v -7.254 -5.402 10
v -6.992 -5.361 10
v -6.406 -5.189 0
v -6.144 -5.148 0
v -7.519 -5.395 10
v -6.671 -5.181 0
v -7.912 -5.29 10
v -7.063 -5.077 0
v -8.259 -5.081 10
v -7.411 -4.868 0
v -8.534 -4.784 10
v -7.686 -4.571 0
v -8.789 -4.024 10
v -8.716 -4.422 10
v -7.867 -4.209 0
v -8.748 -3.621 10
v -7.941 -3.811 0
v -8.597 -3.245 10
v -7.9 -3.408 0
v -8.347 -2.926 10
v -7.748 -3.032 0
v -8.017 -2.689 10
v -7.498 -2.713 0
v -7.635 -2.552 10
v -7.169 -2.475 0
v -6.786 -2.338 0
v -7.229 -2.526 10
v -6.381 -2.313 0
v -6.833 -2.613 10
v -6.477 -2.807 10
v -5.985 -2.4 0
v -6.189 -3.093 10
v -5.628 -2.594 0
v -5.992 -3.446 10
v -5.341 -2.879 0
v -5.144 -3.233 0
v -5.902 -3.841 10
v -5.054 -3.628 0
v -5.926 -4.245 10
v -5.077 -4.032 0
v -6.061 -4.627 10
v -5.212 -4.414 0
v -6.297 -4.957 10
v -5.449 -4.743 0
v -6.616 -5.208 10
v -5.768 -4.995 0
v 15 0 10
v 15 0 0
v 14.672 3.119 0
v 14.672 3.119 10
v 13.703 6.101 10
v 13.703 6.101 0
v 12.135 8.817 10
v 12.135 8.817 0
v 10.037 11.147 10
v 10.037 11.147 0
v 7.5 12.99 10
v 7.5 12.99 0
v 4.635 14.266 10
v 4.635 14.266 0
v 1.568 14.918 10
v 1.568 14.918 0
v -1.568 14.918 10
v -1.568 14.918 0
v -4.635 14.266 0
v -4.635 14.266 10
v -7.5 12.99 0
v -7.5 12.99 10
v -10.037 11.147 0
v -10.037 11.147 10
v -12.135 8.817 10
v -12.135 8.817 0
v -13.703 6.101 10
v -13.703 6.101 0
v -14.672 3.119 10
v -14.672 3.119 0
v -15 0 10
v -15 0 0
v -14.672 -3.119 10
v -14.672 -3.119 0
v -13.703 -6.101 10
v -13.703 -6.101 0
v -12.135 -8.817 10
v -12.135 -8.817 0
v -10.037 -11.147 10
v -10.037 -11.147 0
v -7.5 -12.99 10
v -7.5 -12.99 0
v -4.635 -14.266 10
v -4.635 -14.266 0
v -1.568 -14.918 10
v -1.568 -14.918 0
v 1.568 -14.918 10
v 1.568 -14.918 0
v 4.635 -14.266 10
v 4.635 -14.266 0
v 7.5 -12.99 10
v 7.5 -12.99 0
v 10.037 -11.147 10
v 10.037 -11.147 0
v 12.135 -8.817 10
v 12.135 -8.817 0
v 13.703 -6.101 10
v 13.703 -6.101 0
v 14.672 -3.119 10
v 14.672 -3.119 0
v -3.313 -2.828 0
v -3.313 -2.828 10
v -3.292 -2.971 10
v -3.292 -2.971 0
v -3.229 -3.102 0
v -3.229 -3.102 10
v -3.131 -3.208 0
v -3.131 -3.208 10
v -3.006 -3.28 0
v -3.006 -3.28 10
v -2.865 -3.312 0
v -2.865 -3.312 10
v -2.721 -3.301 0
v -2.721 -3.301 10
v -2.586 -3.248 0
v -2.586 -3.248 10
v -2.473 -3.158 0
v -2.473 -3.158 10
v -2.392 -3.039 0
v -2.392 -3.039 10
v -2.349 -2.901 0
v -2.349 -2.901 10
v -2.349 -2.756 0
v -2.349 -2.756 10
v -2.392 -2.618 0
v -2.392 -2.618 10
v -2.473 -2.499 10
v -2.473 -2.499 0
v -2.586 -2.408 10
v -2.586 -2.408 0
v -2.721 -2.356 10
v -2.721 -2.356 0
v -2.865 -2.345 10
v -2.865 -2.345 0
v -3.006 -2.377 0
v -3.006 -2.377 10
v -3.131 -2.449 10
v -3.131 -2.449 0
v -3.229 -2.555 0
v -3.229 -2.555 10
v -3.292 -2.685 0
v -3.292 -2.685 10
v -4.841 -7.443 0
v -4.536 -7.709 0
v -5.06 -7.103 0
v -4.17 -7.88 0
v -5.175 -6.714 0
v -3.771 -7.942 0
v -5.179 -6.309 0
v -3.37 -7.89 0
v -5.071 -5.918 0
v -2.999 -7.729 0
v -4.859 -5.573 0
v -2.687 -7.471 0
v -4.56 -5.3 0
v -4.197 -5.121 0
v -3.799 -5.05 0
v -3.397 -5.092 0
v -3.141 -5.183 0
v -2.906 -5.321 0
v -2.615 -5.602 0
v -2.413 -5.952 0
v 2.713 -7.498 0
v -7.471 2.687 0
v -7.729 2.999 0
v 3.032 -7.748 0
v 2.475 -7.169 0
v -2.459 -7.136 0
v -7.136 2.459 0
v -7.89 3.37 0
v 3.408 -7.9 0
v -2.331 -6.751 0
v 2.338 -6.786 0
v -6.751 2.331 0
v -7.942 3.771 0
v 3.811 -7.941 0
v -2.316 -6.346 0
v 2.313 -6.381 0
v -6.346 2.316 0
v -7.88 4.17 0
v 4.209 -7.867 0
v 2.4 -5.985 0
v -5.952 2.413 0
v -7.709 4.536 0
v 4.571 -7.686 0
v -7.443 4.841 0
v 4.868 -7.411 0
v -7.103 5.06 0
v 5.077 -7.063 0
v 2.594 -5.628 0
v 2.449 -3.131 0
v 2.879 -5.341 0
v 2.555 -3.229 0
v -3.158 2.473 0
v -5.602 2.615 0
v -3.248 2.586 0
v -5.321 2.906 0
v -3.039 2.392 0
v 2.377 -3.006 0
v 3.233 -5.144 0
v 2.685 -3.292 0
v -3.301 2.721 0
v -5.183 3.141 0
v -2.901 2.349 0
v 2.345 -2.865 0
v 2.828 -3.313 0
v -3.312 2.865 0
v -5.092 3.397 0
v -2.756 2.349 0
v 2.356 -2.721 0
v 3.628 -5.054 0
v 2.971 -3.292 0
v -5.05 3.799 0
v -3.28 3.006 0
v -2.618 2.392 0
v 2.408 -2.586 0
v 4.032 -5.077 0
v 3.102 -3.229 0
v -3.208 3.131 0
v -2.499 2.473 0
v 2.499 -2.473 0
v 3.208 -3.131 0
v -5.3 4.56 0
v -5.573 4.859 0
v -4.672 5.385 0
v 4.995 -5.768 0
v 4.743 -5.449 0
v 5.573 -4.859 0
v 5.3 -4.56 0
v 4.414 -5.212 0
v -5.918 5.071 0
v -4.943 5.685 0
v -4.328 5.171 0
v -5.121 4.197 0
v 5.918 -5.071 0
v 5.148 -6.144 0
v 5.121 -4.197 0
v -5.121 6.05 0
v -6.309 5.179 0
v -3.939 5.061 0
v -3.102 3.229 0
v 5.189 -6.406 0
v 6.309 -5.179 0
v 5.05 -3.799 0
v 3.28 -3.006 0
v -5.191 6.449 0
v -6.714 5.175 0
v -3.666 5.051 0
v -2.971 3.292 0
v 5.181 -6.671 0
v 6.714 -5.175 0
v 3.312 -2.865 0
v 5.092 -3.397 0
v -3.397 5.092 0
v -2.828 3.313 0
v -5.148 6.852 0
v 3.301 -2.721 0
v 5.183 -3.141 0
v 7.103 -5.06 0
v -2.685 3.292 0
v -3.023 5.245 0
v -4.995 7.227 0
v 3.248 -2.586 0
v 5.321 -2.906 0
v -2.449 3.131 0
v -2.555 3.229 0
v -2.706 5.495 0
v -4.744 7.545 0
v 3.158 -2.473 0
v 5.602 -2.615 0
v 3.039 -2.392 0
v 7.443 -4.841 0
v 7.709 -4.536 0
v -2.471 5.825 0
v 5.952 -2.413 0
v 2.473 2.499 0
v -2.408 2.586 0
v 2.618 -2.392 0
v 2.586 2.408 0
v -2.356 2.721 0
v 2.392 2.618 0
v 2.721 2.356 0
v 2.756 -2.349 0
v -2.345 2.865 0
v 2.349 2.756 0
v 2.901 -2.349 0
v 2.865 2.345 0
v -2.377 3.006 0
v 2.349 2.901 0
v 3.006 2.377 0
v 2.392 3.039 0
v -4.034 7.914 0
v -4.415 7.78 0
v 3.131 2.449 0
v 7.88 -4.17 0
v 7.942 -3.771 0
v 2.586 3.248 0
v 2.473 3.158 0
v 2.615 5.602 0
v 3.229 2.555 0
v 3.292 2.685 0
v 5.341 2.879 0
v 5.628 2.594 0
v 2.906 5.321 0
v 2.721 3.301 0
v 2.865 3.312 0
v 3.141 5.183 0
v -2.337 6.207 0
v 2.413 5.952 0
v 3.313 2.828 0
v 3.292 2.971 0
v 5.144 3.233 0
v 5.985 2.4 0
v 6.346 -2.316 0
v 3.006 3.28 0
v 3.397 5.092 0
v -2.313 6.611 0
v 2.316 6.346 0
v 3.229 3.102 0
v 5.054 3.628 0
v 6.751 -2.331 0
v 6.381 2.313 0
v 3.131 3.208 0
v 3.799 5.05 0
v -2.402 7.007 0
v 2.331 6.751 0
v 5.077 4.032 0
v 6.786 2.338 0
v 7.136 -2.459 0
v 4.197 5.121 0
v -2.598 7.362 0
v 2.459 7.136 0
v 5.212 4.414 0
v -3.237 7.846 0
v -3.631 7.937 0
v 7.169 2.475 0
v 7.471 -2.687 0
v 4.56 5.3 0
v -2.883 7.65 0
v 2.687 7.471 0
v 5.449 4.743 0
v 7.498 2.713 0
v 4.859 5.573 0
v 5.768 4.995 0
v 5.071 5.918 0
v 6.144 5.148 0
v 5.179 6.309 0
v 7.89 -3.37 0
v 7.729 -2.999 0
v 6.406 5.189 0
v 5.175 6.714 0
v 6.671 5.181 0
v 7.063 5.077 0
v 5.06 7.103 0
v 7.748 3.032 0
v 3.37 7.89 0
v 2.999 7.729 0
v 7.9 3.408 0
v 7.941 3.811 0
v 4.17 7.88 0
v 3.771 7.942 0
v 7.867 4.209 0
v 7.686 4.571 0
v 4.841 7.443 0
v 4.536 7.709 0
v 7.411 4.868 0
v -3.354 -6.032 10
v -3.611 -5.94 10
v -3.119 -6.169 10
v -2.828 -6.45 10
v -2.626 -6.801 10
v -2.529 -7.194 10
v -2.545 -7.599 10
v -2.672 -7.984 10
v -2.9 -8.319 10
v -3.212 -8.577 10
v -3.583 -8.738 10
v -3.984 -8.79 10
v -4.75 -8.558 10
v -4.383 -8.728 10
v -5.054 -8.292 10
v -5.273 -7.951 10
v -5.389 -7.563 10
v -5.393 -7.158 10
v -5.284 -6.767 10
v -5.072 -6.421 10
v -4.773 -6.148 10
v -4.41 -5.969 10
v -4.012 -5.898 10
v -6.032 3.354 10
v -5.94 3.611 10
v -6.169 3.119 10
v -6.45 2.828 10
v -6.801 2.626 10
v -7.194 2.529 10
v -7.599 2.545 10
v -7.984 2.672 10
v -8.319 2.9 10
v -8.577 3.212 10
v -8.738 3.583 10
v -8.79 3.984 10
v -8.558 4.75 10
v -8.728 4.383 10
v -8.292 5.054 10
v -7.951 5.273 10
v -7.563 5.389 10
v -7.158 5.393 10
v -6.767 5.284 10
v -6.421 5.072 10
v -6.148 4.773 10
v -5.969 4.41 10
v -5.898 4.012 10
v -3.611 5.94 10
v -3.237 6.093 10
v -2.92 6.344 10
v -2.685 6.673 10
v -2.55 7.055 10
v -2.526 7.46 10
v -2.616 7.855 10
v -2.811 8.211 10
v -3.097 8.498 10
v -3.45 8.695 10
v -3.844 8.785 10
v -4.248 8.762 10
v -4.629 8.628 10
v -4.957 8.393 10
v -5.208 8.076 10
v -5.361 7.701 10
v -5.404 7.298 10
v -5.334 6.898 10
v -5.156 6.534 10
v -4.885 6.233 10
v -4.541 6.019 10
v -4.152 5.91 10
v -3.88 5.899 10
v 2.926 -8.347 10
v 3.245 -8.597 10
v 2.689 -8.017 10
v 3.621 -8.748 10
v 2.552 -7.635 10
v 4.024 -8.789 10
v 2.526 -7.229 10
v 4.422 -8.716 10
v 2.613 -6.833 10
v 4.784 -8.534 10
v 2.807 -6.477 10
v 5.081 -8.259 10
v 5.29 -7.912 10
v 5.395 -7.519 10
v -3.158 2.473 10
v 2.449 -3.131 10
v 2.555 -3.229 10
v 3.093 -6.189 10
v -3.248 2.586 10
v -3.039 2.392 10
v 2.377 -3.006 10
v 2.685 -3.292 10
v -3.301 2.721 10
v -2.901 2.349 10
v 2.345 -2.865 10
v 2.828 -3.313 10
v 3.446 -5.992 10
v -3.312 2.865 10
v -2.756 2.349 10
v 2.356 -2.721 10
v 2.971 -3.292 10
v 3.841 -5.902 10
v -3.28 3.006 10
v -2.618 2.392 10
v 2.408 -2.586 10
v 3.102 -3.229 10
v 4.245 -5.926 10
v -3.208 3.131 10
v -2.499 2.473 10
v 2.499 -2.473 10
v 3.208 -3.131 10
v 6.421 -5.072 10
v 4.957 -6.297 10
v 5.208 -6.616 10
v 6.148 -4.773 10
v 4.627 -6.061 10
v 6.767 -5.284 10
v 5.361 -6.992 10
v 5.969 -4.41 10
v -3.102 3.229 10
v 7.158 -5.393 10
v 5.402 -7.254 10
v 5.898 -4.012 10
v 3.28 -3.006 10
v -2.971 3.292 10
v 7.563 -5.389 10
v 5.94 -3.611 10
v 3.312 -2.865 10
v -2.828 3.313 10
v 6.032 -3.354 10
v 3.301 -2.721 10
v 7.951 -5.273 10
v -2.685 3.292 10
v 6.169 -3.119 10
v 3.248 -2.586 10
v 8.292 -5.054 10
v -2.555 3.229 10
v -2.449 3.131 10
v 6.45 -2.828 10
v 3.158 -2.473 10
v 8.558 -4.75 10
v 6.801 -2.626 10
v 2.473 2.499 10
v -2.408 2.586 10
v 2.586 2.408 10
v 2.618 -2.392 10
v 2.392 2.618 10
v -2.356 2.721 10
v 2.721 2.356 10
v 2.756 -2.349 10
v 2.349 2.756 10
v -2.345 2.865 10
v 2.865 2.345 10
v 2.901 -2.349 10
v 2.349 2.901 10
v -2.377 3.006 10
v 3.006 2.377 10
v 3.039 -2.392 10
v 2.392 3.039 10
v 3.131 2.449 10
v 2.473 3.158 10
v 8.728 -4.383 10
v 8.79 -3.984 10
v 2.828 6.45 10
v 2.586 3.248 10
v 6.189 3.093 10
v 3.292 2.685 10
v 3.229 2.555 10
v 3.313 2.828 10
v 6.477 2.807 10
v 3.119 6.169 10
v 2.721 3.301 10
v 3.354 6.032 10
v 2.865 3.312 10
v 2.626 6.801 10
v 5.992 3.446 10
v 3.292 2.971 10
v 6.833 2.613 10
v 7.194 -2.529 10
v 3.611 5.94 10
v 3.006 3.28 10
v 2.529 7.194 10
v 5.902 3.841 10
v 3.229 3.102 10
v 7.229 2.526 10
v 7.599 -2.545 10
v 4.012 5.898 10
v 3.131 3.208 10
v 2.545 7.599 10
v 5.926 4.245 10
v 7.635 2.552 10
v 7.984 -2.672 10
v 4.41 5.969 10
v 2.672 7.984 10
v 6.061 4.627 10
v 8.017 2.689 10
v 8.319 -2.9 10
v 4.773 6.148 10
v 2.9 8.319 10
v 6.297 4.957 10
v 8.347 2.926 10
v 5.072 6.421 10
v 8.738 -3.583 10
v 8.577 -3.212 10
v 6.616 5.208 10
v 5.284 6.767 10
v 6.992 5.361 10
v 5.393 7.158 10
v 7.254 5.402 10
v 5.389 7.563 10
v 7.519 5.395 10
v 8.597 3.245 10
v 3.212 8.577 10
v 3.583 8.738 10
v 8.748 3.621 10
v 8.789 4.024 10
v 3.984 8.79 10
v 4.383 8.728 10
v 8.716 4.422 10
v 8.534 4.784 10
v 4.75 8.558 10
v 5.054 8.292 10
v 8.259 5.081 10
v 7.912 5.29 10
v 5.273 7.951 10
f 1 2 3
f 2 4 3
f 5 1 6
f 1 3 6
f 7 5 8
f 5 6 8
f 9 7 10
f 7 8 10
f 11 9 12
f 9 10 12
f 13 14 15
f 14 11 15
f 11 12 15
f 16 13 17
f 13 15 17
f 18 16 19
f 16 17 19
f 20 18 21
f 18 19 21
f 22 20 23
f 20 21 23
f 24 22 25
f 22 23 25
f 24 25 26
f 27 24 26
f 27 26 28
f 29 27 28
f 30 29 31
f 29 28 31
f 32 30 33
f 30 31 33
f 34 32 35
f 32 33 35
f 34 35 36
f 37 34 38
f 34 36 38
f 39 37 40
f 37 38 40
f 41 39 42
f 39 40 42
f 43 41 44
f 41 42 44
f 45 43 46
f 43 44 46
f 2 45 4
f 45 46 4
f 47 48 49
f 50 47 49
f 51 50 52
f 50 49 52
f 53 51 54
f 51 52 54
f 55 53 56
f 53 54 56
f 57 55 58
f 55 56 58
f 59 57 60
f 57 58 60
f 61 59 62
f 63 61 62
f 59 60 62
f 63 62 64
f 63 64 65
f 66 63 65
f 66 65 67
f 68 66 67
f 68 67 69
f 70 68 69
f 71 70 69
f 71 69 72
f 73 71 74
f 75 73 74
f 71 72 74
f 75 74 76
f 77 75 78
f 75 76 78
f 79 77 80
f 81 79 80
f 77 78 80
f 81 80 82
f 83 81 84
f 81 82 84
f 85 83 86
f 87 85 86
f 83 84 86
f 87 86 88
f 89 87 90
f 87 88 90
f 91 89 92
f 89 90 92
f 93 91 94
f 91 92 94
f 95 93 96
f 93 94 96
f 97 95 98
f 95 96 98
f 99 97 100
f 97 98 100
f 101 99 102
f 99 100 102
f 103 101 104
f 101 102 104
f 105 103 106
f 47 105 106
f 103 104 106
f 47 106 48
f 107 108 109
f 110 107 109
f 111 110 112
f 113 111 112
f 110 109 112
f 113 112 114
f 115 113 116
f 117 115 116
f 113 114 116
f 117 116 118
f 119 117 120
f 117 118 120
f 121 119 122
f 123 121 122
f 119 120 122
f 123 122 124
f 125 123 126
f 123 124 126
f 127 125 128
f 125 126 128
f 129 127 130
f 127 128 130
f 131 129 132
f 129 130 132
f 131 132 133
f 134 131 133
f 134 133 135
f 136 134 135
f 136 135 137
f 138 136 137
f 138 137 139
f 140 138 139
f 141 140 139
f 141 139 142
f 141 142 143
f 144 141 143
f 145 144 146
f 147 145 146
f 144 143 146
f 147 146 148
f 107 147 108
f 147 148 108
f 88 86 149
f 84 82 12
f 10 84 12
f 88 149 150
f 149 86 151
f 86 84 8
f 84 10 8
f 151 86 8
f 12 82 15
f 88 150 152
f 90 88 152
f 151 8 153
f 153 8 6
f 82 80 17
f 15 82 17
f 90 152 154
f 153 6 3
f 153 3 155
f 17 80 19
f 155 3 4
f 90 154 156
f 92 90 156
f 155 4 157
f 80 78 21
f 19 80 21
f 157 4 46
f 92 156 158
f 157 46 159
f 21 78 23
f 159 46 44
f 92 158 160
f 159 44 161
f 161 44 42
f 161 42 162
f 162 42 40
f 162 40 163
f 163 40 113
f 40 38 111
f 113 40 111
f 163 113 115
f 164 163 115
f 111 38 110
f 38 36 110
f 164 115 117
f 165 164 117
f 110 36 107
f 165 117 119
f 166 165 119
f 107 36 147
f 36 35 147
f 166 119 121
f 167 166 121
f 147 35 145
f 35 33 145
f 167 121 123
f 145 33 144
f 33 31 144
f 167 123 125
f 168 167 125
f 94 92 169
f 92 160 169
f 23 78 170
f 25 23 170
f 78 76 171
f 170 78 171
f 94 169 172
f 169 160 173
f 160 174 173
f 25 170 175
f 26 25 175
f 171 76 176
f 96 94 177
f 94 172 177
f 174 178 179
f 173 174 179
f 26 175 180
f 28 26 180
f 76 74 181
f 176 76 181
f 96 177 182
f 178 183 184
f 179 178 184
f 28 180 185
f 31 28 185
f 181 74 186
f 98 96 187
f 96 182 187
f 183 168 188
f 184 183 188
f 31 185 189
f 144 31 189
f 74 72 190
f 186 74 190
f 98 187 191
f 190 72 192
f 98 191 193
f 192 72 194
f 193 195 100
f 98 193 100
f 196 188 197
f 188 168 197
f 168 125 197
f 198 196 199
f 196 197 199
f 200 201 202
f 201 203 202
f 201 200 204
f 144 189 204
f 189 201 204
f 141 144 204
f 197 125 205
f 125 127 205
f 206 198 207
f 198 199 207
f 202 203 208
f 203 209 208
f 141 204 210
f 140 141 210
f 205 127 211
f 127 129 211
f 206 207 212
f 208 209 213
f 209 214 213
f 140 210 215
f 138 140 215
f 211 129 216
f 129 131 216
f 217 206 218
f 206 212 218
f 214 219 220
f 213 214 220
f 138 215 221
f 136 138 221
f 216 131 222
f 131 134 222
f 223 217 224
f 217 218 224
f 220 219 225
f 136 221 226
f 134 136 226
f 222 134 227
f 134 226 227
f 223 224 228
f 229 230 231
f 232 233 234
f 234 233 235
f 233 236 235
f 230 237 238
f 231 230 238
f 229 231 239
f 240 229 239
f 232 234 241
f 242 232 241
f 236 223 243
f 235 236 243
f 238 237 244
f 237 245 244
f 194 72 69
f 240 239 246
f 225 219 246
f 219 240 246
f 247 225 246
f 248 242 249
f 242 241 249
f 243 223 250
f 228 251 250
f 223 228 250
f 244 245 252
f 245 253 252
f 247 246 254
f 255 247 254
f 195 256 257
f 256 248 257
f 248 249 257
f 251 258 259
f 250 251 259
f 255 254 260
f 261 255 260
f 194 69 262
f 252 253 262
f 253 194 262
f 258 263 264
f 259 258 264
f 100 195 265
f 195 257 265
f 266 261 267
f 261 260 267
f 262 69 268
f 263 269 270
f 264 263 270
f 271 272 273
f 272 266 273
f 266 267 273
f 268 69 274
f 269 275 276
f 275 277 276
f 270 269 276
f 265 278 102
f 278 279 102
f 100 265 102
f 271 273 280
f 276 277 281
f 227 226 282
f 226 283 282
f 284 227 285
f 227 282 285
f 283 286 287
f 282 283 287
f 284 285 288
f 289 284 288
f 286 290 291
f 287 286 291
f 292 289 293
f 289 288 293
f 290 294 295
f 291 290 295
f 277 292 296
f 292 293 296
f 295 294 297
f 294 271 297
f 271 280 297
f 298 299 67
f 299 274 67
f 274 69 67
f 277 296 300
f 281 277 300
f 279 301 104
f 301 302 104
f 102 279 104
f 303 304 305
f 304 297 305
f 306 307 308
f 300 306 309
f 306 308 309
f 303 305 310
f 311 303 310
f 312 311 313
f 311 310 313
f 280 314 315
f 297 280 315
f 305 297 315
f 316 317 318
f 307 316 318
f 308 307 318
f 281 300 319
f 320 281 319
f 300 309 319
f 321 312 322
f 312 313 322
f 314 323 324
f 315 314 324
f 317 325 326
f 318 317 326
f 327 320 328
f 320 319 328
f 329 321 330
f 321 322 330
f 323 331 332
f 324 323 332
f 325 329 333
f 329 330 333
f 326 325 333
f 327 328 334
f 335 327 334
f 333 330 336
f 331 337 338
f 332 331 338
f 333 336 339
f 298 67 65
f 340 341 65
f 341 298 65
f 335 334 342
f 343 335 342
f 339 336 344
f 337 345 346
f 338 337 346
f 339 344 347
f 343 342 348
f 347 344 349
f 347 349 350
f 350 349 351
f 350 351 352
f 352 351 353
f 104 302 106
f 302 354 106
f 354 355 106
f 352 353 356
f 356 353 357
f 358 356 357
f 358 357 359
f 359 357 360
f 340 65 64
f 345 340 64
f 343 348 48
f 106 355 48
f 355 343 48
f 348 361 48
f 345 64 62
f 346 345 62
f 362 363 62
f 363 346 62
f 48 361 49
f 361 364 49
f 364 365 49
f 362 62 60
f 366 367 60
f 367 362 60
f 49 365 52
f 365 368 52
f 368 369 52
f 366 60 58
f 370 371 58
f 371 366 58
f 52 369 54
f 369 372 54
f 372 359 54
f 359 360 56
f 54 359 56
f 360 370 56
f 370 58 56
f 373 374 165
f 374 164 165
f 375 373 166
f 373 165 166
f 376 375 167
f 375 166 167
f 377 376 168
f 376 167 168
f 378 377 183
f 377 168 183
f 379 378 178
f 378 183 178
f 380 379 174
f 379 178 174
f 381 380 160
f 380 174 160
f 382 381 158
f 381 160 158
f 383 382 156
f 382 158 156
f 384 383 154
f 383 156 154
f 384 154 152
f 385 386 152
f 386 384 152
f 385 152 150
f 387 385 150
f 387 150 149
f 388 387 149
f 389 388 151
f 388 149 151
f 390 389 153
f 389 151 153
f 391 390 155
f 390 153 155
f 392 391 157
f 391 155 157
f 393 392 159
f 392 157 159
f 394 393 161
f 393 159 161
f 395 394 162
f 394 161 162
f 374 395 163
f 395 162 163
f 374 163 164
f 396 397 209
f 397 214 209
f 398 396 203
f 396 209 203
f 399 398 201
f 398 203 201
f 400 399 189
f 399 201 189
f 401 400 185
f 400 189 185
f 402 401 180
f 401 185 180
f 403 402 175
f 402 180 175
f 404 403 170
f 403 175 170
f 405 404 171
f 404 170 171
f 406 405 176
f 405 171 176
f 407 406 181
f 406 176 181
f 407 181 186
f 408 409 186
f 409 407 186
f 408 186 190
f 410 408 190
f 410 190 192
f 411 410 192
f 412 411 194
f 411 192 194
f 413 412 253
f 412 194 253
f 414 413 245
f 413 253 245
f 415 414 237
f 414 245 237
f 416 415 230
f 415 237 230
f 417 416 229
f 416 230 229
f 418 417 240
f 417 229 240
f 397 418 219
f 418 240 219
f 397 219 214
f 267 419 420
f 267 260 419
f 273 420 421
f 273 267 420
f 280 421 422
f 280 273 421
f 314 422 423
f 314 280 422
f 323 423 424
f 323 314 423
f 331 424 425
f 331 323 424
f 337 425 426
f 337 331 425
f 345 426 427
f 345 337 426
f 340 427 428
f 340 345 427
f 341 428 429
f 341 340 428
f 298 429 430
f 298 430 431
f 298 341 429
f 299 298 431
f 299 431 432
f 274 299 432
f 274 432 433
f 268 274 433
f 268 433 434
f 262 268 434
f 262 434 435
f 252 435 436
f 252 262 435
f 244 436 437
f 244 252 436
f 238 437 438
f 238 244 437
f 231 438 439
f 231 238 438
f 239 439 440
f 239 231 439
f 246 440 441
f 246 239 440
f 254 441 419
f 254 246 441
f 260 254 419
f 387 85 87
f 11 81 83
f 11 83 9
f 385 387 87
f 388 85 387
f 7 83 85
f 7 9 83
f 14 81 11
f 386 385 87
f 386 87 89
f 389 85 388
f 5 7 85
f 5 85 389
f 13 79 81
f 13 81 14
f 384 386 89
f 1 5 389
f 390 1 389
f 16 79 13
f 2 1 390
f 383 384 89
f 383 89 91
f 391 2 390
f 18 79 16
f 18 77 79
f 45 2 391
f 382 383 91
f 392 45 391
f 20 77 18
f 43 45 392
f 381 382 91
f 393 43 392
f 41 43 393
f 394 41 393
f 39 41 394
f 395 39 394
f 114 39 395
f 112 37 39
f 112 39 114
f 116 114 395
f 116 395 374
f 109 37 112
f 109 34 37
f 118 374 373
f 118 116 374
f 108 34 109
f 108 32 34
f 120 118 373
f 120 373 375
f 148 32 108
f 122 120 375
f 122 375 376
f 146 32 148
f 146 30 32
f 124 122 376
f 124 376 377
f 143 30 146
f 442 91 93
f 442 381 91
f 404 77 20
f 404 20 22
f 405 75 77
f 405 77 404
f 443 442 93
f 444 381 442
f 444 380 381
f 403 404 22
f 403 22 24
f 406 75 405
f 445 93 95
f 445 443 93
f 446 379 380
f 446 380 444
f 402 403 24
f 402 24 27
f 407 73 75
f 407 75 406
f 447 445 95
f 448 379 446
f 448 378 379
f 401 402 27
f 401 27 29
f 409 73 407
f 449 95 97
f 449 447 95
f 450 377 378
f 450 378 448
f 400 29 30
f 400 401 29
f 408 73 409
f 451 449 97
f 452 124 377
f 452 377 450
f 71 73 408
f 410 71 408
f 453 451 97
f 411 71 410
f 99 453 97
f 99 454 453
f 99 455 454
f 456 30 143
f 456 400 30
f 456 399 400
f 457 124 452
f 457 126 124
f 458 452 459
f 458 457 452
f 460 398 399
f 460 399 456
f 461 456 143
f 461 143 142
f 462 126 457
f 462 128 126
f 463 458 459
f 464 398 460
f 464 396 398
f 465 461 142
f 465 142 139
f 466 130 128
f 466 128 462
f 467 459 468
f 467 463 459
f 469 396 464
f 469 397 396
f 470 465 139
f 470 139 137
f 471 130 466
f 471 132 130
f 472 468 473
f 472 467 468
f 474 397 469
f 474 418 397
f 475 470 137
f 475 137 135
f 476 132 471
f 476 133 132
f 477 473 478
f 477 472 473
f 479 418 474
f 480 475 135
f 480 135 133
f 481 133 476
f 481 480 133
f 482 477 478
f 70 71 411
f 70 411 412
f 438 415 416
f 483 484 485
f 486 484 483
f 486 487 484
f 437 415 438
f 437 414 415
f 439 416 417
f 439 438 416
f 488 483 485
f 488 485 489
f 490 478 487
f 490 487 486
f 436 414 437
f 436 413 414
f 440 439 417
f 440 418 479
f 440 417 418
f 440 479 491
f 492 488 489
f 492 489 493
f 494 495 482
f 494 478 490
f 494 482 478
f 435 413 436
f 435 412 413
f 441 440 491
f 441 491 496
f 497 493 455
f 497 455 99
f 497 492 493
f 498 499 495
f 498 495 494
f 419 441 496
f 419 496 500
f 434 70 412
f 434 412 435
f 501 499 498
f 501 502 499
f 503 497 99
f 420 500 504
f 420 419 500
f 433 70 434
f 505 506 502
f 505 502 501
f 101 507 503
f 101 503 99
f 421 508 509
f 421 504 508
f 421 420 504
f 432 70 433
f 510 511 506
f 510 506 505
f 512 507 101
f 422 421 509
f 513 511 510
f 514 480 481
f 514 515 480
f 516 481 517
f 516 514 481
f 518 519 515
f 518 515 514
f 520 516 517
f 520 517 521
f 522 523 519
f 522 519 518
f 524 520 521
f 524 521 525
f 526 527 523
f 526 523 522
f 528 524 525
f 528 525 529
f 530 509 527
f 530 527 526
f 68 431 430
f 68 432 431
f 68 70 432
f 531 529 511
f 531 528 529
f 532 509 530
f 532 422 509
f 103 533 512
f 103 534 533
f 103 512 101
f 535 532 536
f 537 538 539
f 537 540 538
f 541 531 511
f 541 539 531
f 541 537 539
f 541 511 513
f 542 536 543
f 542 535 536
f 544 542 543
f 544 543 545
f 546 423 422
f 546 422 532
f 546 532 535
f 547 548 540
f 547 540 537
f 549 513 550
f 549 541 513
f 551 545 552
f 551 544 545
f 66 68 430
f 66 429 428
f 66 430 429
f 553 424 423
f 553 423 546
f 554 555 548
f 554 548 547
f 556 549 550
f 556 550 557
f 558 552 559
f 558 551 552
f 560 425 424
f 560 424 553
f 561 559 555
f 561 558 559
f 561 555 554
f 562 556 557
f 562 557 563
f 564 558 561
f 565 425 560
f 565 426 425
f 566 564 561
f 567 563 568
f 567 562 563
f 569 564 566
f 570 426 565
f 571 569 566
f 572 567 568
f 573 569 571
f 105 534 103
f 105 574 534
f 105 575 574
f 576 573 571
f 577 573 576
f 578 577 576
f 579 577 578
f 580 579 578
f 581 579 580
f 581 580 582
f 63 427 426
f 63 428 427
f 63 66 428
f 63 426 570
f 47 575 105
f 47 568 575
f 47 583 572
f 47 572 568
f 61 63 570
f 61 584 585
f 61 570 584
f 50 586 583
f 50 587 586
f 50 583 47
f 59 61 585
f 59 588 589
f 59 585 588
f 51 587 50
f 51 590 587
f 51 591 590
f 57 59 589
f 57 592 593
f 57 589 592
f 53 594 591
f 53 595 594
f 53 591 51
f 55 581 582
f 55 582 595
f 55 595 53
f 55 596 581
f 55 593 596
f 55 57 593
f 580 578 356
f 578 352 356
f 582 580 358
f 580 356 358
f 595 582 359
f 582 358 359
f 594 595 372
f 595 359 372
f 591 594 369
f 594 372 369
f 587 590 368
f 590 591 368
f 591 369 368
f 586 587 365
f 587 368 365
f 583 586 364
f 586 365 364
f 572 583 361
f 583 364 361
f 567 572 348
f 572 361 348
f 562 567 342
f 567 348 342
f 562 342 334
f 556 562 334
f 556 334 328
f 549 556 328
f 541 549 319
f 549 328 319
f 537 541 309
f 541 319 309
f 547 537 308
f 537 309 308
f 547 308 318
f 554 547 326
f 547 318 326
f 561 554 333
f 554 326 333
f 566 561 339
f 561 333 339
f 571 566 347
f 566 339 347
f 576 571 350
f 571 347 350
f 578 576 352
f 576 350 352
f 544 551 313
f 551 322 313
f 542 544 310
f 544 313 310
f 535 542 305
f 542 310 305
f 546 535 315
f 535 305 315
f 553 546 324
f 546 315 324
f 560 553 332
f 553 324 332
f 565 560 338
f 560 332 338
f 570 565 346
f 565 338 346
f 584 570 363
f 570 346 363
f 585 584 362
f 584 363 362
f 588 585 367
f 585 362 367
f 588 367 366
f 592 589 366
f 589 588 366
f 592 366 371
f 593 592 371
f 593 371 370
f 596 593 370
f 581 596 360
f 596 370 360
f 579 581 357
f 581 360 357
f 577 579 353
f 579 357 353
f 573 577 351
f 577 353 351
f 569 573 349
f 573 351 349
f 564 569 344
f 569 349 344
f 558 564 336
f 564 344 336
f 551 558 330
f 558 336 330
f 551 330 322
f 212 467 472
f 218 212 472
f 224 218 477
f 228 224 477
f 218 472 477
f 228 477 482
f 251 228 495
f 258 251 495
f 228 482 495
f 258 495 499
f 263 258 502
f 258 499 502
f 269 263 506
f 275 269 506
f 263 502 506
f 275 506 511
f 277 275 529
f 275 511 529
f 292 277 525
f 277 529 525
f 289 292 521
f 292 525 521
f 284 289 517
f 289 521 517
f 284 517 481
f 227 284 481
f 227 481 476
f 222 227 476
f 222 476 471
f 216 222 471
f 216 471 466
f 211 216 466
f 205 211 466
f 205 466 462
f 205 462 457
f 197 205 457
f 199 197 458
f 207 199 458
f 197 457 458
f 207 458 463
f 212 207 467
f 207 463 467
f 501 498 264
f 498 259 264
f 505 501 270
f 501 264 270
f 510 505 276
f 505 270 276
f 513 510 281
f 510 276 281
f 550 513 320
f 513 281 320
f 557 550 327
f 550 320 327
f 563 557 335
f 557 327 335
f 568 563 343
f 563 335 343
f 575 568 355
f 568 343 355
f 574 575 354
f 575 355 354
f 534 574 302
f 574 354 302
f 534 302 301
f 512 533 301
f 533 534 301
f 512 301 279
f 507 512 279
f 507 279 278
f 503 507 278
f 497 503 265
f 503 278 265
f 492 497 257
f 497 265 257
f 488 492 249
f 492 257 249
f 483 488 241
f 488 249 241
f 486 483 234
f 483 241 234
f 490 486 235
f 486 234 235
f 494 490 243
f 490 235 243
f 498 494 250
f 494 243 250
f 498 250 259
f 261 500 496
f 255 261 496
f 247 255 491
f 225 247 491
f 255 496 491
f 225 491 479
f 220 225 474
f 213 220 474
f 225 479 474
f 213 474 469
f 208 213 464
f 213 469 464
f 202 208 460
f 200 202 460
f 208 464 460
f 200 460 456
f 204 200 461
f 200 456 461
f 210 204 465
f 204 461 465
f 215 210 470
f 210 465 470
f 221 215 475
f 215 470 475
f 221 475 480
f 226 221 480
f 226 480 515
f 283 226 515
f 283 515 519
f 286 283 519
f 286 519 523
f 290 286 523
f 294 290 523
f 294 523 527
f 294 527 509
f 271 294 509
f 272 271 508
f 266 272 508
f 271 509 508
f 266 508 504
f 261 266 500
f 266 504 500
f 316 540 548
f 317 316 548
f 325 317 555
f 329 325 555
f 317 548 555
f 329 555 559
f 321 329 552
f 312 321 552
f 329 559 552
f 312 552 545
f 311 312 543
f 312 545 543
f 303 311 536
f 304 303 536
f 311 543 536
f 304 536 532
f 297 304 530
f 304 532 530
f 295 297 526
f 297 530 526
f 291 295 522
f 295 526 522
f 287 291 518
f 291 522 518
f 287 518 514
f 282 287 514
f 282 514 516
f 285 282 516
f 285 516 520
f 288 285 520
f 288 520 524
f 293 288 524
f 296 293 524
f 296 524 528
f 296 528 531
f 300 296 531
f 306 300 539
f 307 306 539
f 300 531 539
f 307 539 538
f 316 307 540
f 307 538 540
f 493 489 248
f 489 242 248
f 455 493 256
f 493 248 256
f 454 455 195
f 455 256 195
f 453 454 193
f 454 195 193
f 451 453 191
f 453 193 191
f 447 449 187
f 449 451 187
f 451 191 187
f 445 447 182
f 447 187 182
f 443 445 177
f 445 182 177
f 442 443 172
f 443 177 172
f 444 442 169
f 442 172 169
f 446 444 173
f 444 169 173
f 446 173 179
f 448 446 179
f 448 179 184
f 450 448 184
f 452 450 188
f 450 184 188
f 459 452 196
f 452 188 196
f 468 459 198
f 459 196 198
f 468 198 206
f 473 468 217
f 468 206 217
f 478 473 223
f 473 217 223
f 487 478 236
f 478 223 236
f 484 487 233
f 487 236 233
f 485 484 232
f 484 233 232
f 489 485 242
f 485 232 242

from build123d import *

# Parameters (mm, degrees)
SKETCH1_R                   = 15
BOSS_EXTRUDE1_DEPTH         = 10
SKETCH2_R                   = 0.484915
CUT_EXTRUDE1_DEPTH          = 10
CIRPATTERN1_COUNT           = 4
SKETCH7_R                   = 1.44135
CUT_EXTRUDE2_DEPTH          = 24.34691072
CIRPATTERN2_COUNT           = 4
CIRPATTERN2_COPY_1_SKETCH_R = 1.44135
CIRPATTERN2_COPY_1_DEPTH    = 24.34691072
CIRPATTERN2_COPY_2_SKETCH_R = 1.44135
CIRPATTERN2_COPY_2_DEPTH    = 24.34691072
CIRPATTERN2_COPY_3_SKETCH_R = 1.44135
CIRPATTERN2_COPY_3_DEPTH    = 24.34691072


with BuildPart() as part:
    # Sketch1 → Boss-Extrude1 (new body)
    with BuildSketch(Plane.XY):
        Circle(SKETCH1_R)
    extrude(amount=BOSS_EXTRUDE1_DEPTH)

    # Sketch2 → Cut-Extrude1 (cut)
    with BuildSketch(Plane.XY.offset(10)):
        with Locations((2.828427125, 2.828427125)):
            Circle(SKETCH2_R)
    cut_extrude1 = extrude(amount=-CUT_EXTRUDE1_DEPTH, mode=Mode.SUBTRACT)

    # CirPattern1: Cut-Extrude1 ×4 about axis
    cirpattern1_axis = Axis((0, 0, 10), (0, 0, -1))
    for i in range(1, CIRPATTERN1_COUNT):
        add(cut_extrude1.rotate(cirpattern1_axis, i * 360 / CIRPATTERN1_COUNT), mode=Mode.SUBTRACT)

    # Sketch7 → Cut-Extrude2 (cut, symmetric)
    with BuildSketch(Plane(origin=(-0.025287604, 0.006355569, 0.298027772), x_dir=(0.2437507452891652, 0.9698379112877453, 0), z_dir=(0.08452694350312104, -0.02124427725097248, -0.9961946980917455))):
        with Locations((2.053684635, -7.185898346)):
            Circle(SKETCH7_R)
    cut_extrude2 = extrude(amount=CUT_EXTRUDE2_DEPTH, both=True, mode=Mode.SUBTRACT)

    # Mirror1: Cut-Extrude2 across plane
    add(cut_extrude2.mirror(Plane(origin=(0, 0, 0), x_dir=(0, 0, 1), z_dir=(-0.7071067811865512, -0.7071067811865438, 0))), mode=Mode.SUBTRACT)

    # CirPattern2: Cut-Extrude2 ×4 about axis
    cirpattern2_axis = Axis((0, 0, 10), (0, 0, -1))
    for i in range(1, CIRPATTERN2_COUNT):
        add(cut_extrude2.rotate(cirpattern2_axis, i * 360 / CIRPATTERN2_COUNT), mode=Mode.SUBTRACT)

    # CirPattern2 copy 1 sketch → CirPattern2 copy 1 (cut, symmetric)
    with BuildSketch(Plane(origin=(0.025287604, 0.006355569, 0.298027772), x_dir=(-0.24375074528915505, 0.9698379112877479, 0), z_dir=(-0.08452694350312126, -0.021244277250971604, -0.9961946980917455))):
        with Locations((2.053684635, 7.185898346)):
            Circle(CIRPATTERN2_COPY_1_SKETCH_R)
    extrude(amount=CIRPATTERN2_COPY_1_DEPTH, both=True, mode=Mode.SUBTRACT)

    # CirPattern2 copy 2 sketch → CirPattern2 copy 2 (cut, symmetric)
    with BuildSketch(Plane(origin=(0.006355569, -0.025287604, 0.298027772), x_dir=(0.9698379112877479, 0.2437507452891551, 0), z_dir=(-0.02124427725097161, 0.08452694350312126, -0.9961946980917455))):
        with Locations((2.053684635, 7.185898346)):
            Circle(CIRPATTERN2_COPY_2_SKETCH_R)
    extrude(amount=CIRPATTERN2_COPY_2_DEPTH, both=True, mode=Mode.SUBTRACT)

    # CirPattern2 copy 3 sketch → CirPattern2 copy 3 (cut, symmetric)
    with BuildSketch(Plane(origin=(-0.025287604, -0.006355569, 0.298027772), x_dir=(0.24375074528915516, -0.9698379112877479, 0), z_dir=(0.08452694350312126, 0.021244277250971614, -0.9961946980917455))):
        with Locations((2.053684635, 7.185898346)):
            Circle(CIRPATTERN2_COPY_3_SKETCH_R)
    extrude(amount=CIRPATTERN2_COPY_3_DEPTH, both=True, mode=Mode.SUBTRACT)


solid = part.part
